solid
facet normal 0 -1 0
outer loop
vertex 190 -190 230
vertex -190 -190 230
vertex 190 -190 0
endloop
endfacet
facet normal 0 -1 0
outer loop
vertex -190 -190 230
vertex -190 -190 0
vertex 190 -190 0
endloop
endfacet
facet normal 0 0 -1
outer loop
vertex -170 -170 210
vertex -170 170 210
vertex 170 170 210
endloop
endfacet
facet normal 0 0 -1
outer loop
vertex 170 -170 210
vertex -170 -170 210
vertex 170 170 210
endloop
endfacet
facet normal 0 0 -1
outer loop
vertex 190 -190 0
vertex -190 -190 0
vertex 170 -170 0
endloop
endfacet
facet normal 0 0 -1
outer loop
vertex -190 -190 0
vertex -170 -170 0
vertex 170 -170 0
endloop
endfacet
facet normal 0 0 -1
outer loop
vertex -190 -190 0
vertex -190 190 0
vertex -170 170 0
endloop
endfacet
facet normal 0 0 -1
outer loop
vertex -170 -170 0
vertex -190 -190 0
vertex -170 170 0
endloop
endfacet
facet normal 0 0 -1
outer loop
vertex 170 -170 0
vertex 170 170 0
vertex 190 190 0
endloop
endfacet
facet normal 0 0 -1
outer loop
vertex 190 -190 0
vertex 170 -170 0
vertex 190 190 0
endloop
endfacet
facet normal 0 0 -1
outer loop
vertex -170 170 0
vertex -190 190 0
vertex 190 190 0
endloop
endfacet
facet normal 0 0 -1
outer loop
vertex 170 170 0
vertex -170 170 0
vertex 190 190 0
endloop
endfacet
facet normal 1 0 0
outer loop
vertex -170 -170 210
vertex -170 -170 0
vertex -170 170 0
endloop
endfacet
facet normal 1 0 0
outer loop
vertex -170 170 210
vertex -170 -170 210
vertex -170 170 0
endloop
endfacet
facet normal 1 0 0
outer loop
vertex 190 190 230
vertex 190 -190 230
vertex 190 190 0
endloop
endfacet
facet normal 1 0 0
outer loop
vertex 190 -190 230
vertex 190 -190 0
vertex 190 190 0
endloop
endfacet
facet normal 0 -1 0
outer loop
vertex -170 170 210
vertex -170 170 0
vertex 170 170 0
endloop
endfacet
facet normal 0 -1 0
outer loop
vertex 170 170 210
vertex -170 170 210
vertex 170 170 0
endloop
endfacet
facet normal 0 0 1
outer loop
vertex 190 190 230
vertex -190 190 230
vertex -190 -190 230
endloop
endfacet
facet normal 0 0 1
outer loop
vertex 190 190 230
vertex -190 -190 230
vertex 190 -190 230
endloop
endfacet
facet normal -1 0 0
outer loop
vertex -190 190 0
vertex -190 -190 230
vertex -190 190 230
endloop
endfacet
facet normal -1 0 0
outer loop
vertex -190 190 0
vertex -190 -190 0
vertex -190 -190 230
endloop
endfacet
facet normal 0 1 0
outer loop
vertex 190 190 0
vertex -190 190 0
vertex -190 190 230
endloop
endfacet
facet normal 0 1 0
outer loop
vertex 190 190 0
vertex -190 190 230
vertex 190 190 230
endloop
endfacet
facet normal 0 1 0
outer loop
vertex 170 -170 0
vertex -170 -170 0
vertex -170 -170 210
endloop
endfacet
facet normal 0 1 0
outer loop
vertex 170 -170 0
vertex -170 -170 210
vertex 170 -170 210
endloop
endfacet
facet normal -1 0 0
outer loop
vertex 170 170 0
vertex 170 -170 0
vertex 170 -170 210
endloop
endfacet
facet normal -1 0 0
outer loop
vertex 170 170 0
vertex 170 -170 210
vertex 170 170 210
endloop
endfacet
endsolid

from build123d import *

# Parameters (mm, degrees)
ESQUISSE1_W        = 380
ESQUISSE1_H        = 380
ESQUISSE1_W_2      = 340
ESQUISSE1_H_2      = 340
BOSS_EXTRU_1_DEPTH = 210
ESQUISSE2_W        = 380
ESQUISSE2_H        = 380
BOSS_EXTRU_2_DEPTH = 20


with BuildPart() as part:
    # Esquisse1 → Boss.-Extru.1 (new body)
    with BuildSketch(Plane.XY):
        Rectangle(ESQUISSE1_W, ESQUISSE1_H)
        Rectangle(ESQUISSE1_W_2, ESQUISSE1_H_2, mode=Mode.SUBTRACT)
    extrude(amount=BOSS_EXTRU_1_DEPTH)

    # Esquisse2 → Boss.-Extru.2 (add)
    with BuildSketch(Plane.XY.offset(210)):
        Rectangle(ESQUISSE2_W, ESQUISSE2_H)
    extrude(amount=BOSS_EXTRU_2_DEPTH)


solid = part.part
